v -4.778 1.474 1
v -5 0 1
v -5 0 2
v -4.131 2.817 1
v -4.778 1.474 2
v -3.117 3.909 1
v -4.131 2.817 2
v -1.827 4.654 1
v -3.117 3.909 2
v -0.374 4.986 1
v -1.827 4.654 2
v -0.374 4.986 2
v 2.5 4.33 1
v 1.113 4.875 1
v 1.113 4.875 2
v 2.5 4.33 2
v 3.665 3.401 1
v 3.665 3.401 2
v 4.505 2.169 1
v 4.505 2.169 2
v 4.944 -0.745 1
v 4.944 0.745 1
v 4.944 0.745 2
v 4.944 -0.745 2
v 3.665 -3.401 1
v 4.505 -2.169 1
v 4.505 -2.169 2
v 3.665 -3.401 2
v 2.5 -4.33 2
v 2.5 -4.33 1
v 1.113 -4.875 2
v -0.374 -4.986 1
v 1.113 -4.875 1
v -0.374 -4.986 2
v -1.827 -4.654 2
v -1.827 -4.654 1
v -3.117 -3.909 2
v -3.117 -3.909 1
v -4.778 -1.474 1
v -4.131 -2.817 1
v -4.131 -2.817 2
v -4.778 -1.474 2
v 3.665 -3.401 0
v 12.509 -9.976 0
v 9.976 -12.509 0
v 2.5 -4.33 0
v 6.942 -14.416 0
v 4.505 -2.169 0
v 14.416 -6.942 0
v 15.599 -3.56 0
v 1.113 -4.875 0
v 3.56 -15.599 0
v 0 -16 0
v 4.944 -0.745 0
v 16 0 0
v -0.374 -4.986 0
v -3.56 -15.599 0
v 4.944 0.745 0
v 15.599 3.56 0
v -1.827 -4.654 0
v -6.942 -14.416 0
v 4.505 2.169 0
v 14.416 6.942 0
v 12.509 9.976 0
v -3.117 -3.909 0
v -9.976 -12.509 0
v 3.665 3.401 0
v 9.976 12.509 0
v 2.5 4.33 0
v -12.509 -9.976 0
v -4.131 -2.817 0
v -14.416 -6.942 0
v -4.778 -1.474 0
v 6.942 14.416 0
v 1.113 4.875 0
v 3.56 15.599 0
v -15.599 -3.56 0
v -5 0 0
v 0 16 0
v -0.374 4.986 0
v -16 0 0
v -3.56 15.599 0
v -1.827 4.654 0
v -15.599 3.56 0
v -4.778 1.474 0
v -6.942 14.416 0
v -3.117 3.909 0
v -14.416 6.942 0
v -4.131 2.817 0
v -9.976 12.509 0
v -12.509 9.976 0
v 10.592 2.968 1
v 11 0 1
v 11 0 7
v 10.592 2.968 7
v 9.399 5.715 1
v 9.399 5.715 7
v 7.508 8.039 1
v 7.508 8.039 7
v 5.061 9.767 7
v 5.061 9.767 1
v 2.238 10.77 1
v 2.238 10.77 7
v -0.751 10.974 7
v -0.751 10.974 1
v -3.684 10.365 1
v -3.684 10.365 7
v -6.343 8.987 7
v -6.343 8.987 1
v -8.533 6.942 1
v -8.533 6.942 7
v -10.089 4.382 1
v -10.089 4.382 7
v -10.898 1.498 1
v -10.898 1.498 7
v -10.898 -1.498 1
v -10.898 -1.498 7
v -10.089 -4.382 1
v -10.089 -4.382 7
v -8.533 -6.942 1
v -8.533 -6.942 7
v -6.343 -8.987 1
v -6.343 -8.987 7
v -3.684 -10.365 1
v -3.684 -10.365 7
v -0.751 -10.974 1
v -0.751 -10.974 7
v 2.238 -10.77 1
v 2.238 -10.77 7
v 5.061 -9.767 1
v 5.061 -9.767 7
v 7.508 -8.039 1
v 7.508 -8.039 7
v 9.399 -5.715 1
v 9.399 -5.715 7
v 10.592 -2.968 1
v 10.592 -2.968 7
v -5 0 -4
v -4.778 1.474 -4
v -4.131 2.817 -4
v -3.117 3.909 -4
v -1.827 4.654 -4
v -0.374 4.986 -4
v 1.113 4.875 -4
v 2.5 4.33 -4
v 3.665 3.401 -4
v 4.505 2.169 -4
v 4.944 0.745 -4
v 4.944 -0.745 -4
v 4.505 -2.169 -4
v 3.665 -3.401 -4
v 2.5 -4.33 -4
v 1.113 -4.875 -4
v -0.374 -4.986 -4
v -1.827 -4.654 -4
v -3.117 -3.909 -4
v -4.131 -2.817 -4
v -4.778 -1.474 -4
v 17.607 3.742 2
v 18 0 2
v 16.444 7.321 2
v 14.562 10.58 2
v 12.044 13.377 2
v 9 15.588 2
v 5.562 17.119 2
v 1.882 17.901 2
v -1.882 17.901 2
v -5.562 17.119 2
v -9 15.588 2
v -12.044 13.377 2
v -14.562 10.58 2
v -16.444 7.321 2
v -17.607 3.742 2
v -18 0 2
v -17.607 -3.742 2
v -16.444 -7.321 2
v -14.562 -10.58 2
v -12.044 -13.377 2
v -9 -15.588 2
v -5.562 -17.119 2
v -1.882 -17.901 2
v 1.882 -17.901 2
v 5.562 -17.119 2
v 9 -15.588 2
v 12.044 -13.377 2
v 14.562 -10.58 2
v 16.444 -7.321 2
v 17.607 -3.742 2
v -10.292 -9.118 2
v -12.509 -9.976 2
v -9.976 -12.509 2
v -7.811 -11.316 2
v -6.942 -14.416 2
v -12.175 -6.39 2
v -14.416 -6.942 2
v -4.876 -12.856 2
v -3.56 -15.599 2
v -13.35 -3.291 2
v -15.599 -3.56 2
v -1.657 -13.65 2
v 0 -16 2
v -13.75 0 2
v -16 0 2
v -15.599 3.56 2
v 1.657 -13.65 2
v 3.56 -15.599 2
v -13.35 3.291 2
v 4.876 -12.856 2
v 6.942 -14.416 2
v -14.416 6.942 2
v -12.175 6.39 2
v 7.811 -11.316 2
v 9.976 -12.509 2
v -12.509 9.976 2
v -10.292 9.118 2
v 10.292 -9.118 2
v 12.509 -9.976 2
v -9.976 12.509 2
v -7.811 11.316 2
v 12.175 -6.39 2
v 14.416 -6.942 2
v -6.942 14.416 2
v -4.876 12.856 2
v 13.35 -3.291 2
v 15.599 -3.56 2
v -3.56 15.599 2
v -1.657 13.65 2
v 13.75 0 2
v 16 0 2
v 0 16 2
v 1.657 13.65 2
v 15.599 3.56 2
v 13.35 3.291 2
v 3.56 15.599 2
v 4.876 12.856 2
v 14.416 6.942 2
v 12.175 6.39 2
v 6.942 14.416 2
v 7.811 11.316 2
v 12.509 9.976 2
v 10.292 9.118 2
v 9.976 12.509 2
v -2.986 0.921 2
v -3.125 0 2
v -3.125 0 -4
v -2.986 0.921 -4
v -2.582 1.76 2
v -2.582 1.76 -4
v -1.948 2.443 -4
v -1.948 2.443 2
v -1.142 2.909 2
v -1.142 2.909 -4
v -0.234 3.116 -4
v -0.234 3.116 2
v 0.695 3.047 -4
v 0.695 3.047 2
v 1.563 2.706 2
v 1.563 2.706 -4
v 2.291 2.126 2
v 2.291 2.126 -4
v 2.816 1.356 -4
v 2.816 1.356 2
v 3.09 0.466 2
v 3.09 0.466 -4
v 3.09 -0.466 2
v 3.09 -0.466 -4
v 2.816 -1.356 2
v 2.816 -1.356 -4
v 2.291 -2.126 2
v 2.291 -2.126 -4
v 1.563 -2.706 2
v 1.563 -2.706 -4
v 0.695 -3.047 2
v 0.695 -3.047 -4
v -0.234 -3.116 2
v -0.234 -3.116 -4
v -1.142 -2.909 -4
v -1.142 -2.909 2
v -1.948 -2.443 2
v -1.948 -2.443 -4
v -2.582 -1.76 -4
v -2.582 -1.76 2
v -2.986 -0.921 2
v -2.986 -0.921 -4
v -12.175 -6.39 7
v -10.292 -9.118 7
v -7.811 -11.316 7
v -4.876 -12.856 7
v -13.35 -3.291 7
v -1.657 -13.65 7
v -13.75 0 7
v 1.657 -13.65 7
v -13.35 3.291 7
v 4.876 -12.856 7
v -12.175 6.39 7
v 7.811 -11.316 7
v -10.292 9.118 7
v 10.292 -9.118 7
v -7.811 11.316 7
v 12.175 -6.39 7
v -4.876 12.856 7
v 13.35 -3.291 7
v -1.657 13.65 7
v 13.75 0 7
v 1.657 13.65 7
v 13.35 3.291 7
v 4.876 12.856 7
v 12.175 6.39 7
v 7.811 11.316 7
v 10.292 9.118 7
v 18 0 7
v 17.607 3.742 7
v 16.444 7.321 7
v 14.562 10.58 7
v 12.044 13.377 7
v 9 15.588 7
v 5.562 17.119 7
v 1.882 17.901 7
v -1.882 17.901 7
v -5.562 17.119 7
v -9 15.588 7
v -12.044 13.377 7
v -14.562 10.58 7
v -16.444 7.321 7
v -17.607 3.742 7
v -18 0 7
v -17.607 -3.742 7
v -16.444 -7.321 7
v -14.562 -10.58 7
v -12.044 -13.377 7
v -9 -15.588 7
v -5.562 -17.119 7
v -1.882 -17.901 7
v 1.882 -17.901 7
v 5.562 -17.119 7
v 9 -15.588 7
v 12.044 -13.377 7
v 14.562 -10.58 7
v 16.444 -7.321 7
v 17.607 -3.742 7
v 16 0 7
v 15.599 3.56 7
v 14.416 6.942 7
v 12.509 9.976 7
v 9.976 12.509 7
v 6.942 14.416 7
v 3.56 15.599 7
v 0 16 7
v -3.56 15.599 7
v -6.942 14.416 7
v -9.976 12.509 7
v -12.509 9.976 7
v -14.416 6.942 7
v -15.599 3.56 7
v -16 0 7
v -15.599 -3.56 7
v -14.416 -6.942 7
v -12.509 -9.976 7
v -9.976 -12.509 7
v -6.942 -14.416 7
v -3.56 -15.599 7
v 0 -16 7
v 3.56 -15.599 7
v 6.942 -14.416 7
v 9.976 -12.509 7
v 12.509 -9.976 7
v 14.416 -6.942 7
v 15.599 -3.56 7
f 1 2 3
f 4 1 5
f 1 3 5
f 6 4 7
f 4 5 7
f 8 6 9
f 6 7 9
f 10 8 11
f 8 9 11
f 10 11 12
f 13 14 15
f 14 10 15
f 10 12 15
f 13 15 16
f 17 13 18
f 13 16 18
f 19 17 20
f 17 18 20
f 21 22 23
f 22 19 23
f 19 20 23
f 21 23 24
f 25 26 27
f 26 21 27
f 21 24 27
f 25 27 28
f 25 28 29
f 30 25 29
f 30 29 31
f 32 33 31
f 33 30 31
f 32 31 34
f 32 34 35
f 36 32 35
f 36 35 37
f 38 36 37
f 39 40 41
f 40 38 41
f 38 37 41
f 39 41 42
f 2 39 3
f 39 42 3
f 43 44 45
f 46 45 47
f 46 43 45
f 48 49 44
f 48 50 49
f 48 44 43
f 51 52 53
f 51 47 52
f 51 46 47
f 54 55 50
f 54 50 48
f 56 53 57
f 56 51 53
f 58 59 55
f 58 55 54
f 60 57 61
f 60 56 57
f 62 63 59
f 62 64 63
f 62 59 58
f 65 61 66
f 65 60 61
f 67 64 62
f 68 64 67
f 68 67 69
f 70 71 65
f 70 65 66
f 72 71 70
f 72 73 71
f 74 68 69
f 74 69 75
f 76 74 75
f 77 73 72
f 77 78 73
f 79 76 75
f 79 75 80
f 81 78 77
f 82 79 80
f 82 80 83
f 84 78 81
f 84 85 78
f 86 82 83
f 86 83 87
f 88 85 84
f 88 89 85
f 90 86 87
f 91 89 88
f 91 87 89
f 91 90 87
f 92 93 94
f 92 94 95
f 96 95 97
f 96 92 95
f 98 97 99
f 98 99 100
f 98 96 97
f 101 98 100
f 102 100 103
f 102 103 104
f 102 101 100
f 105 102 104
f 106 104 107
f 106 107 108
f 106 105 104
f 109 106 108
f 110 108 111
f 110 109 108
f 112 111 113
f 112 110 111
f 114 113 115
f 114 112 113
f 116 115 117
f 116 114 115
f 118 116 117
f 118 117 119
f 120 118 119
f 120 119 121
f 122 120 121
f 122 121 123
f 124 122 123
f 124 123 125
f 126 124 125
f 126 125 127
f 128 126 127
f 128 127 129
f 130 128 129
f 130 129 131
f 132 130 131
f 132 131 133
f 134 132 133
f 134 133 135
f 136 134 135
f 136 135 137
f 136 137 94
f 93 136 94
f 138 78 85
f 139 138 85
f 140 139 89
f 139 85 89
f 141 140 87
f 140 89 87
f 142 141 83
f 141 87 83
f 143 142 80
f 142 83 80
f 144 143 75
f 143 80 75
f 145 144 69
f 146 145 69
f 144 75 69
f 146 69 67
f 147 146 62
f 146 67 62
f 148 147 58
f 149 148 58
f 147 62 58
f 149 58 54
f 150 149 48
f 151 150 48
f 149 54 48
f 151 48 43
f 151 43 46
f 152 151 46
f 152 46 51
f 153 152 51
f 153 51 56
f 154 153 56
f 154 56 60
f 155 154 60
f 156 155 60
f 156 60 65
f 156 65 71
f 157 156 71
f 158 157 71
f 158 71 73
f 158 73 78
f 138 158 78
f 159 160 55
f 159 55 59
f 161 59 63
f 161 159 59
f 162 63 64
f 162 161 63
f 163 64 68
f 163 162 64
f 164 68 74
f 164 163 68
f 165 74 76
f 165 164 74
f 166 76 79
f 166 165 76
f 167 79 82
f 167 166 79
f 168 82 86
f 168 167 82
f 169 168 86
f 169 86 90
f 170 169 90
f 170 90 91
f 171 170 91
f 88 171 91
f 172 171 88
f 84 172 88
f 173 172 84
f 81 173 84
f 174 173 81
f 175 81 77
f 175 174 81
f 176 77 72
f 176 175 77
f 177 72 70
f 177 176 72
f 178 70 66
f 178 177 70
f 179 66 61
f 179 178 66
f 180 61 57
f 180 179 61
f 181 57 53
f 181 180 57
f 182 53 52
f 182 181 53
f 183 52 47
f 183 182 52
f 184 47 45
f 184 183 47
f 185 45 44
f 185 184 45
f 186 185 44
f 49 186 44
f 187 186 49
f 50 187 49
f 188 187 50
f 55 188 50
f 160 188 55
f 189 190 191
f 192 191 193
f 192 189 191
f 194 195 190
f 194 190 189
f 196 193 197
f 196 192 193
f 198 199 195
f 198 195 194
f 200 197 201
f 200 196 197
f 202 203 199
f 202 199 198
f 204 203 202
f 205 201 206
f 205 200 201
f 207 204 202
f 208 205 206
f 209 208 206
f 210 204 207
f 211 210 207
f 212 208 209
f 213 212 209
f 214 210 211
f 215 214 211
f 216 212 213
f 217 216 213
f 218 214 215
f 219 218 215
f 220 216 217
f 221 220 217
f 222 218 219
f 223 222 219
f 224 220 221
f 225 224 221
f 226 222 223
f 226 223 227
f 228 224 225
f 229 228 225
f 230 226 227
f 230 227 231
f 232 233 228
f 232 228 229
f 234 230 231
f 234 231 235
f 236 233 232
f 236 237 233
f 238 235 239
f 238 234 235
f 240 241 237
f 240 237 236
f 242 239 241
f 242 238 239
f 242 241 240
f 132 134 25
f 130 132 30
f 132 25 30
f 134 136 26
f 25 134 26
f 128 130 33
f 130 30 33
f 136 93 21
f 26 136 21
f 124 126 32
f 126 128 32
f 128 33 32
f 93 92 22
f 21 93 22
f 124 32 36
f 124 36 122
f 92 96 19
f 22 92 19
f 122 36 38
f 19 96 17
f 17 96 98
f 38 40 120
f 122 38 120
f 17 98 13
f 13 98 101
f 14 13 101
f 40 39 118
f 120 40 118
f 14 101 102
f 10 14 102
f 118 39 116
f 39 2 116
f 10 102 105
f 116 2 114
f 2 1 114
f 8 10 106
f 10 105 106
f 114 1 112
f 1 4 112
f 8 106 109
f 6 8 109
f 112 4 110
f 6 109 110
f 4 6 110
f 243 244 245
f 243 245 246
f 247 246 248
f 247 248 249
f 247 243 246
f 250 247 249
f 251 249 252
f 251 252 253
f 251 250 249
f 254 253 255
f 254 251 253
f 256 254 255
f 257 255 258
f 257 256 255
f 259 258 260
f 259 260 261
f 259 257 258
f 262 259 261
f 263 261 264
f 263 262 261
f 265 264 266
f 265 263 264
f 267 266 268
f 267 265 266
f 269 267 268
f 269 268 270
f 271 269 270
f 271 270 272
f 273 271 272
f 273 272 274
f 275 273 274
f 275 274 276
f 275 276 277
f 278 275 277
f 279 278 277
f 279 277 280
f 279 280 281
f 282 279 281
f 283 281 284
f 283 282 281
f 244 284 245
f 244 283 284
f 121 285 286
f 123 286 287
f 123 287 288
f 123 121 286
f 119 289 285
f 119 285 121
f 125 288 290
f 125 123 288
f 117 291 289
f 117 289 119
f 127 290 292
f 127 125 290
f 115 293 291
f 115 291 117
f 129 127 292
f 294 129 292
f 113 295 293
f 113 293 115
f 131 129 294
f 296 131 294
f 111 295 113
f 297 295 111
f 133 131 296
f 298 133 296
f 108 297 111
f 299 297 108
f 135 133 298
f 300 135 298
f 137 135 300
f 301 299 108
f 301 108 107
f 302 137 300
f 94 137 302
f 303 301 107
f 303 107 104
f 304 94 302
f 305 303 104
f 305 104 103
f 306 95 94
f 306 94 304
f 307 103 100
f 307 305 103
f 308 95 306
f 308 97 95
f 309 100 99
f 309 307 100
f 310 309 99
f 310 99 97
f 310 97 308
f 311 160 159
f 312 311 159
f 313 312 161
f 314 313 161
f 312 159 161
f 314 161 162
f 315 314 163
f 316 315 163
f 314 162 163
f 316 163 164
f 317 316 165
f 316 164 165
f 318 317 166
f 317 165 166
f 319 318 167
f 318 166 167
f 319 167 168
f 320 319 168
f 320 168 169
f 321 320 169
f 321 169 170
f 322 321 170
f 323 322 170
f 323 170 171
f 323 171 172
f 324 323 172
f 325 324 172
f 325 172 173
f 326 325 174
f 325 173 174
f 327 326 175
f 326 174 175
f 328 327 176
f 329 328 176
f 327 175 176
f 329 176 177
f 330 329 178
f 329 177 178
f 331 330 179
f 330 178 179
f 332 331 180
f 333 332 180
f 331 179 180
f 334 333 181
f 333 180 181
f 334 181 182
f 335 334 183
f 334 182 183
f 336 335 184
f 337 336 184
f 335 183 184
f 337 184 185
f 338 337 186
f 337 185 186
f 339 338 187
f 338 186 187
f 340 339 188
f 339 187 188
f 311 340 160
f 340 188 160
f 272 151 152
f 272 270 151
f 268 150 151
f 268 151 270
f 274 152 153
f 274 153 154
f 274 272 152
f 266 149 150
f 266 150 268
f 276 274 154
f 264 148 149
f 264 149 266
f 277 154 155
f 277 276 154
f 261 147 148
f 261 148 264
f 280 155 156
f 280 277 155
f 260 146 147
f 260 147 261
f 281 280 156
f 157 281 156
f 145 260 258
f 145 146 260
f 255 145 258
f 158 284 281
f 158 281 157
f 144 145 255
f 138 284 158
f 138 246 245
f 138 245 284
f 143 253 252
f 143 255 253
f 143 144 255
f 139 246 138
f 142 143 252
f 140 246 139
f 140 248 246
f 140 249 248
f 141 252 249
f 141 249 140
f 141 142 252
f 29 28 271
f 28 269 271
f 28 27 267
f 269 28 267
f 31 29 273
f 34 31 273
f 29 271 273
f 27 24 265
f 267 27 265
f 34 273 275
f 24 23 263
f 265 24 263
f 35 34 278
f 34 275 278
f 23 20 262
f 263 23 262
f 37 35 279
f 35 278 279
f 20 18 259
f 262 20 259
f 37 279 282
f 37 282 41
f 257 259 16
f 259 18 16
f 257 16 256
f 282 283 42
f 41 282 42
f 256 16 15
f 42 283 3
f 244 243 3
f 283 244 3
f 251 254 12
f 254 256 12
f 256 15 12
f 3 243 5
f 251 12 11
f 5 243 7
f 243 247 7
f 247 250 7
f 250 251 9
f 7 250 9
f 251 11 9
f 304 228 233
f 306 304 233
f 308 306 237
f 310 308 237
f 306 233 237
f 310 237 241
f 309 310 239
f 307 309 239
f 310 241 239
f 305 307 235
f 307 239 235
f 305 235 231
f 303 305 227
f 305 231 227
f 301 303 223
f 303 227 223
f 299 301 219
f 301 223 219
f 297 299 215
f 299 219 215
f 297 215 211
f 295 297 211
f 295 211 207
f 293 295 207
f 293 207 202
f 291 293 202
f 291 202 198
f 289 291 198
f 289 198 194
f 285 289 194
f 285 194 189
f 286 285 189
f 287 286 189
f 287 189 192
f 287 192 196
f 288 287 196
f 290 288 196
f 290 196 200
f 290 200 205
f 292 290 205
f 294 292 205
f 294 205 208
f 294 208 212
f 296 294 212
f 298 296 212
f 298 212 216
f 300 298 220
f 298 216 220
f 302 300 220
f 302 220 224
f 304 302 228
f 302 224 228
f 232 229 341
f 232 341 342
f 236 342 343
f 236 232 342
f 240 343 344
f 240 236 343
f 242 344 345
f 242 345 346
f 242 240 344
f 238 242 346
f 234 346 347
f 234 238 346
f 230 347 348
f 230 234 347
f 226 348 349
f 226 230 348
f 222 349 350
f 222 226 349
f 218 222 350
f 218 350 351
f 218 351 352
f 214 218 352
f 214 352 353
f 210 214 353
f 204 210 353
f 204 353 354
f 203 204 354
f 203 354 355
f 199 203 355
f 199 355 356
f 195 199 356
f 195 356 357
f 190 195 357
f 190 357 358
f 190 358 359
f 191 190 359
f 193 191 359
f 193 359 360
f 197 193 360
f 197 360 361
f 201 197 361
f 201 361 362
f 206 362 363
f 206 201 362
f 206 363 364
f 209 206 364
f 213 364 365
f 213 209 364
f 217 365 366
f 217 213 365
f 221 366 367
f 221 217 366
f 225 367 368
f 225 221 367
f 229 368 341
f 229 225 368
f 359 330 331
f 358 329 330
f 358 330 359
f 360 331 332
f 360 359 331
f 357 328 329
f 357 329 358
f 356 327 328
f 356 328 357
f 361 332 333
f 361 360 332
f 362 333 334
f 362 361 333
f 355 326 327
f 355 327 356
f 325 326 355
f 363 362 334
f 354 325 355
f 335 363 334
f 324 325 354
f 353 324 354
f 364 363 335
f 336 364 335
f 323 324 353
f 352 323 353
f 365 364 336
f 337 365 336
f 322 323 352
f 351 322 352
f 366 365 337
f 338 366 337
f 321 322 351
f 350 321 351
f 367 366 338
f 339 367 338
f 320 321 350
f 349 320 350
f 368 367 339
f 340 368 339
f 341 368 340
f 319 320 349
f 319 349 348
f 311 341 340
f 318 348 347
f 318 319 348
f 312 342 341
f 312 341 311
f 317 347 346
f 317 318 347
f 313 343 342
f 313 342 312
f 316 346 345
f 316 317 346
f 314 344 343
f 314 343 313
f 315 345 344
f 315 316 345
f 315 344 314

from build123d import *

# Parameters (mm, degrees)
ESQUISSE1_R             = 13.75
ESQUISSE1_R_2           = 11
BOSS_EXTRU_1_DEPTH      = 7
ESQUISSE1_R_3           = 18
ESQUISSE1_R_4           = 16
BOSS_EXTRU_1_2_DEPTH    = 7
ESQUISSE1_3_R           = 16
ESQUISSE1_3_R_2         = 13.75
BOSS_EXTRU_2_DEPTH      = 2
CHANFREIN1_SIZE         = 2
BOSS_EXTRU_3_DEPTH      = 4
BOSS_EXTRU_3_DEPTH_BACK = 2
ESQUISSE3_R             = 5
ESQUISSE3_R_2           = 3.125
ESQUISSE4_R             = 11
ESQUISSE4_R_2           = 3.834531167
BOSS_EXTRU_4_DEPTH      = 1


with BuildPart() as part:
    # Esquisse1 → Boss.-Extru.1 (new body)
    with BuildSketch(Plane.XY):
        Circle(ESQUISSE1_R)
        Circle(ESQUISSE1_R_2, mode=Mode.SUBTRACT)
    extrude(amount=BOSS_EXTRU_1_DEPTH)



with BuildPart() as body_2:
    # Esquisse1 → Boss.-Extru.1 2 (new body)
    with BuildSketch(Plane.XY):
        Circle(ESQUISSE1_R_3)
        Circle(ESQUISSE1_R_4, mode=Mode.SUBTRACT)
    extrude(amount=BOSS_EXTRU_1_2_DEPTH)


with BuildPart() as part_1:
    add(part.part)

    add(body_2.part)  # Boss.-Extru.2 merges body 2
    # Esquisse1<3> → Boss.-Extru.2 (add)
    with BuildSketch(Plane.XY):
        Circle(ESQUISSE1_3_R)
        Circle(ESQUISSE1_3_R_2, mode=Mode.SUBTRACT)
    extrude(amount=BOSS_EXTRU_2_DEPTH)

    # Chanfrein1
    chanfrein1_edges = [part_1.edges().sort_by_distance(p)[0] for p in [
        (-18, 0, 0),
    ]]
    chamfer(chanfrein1_edges, length=CHANFREIN1_SIZE)



with BuildPart() as body_2_2:
    # Esquisse3 → Boss.-Extru.3 (new, two sides: drawn at the far end of the back side and taken through both)
    with BuildSketch(Plane(origin=(0, 0, 0), x_dir=(-1, 0, 0), z_dir=(0, 0, -1)).offset(-BOSS_EXTRU_3_DEPTH_BACK)):
        Circle(ESQUISSE3_R)
        Circle(ESQUISSE3_R_2, mode=Mode.SUBTRACT)
    extrude(amount=BOSS_EXTRU_3_DEPTH + BOSS_EXTRU_3_DEPTH_BACK)


with BuildPart() as part_2:
    add(part_1.part)

    add(body_2_2.part)  # Boss.-Extru.4 merges body 2 2
    # Esquisse4 → Boss.-Extru.4 (add)
    with BuildSketch(Plane(origin=(0, 0, 0), x_dir=(-1, 0, 0), z_dir=(0, 0, -1))):
        Circle(ESQUISSE4_R)
        Circle(ESQUISSE4_R_2, mode=Mode.SUBTRACT)
    extrude(amount=-BOSS_EXTRU_4_DEPTH)


solid = part_2.part
